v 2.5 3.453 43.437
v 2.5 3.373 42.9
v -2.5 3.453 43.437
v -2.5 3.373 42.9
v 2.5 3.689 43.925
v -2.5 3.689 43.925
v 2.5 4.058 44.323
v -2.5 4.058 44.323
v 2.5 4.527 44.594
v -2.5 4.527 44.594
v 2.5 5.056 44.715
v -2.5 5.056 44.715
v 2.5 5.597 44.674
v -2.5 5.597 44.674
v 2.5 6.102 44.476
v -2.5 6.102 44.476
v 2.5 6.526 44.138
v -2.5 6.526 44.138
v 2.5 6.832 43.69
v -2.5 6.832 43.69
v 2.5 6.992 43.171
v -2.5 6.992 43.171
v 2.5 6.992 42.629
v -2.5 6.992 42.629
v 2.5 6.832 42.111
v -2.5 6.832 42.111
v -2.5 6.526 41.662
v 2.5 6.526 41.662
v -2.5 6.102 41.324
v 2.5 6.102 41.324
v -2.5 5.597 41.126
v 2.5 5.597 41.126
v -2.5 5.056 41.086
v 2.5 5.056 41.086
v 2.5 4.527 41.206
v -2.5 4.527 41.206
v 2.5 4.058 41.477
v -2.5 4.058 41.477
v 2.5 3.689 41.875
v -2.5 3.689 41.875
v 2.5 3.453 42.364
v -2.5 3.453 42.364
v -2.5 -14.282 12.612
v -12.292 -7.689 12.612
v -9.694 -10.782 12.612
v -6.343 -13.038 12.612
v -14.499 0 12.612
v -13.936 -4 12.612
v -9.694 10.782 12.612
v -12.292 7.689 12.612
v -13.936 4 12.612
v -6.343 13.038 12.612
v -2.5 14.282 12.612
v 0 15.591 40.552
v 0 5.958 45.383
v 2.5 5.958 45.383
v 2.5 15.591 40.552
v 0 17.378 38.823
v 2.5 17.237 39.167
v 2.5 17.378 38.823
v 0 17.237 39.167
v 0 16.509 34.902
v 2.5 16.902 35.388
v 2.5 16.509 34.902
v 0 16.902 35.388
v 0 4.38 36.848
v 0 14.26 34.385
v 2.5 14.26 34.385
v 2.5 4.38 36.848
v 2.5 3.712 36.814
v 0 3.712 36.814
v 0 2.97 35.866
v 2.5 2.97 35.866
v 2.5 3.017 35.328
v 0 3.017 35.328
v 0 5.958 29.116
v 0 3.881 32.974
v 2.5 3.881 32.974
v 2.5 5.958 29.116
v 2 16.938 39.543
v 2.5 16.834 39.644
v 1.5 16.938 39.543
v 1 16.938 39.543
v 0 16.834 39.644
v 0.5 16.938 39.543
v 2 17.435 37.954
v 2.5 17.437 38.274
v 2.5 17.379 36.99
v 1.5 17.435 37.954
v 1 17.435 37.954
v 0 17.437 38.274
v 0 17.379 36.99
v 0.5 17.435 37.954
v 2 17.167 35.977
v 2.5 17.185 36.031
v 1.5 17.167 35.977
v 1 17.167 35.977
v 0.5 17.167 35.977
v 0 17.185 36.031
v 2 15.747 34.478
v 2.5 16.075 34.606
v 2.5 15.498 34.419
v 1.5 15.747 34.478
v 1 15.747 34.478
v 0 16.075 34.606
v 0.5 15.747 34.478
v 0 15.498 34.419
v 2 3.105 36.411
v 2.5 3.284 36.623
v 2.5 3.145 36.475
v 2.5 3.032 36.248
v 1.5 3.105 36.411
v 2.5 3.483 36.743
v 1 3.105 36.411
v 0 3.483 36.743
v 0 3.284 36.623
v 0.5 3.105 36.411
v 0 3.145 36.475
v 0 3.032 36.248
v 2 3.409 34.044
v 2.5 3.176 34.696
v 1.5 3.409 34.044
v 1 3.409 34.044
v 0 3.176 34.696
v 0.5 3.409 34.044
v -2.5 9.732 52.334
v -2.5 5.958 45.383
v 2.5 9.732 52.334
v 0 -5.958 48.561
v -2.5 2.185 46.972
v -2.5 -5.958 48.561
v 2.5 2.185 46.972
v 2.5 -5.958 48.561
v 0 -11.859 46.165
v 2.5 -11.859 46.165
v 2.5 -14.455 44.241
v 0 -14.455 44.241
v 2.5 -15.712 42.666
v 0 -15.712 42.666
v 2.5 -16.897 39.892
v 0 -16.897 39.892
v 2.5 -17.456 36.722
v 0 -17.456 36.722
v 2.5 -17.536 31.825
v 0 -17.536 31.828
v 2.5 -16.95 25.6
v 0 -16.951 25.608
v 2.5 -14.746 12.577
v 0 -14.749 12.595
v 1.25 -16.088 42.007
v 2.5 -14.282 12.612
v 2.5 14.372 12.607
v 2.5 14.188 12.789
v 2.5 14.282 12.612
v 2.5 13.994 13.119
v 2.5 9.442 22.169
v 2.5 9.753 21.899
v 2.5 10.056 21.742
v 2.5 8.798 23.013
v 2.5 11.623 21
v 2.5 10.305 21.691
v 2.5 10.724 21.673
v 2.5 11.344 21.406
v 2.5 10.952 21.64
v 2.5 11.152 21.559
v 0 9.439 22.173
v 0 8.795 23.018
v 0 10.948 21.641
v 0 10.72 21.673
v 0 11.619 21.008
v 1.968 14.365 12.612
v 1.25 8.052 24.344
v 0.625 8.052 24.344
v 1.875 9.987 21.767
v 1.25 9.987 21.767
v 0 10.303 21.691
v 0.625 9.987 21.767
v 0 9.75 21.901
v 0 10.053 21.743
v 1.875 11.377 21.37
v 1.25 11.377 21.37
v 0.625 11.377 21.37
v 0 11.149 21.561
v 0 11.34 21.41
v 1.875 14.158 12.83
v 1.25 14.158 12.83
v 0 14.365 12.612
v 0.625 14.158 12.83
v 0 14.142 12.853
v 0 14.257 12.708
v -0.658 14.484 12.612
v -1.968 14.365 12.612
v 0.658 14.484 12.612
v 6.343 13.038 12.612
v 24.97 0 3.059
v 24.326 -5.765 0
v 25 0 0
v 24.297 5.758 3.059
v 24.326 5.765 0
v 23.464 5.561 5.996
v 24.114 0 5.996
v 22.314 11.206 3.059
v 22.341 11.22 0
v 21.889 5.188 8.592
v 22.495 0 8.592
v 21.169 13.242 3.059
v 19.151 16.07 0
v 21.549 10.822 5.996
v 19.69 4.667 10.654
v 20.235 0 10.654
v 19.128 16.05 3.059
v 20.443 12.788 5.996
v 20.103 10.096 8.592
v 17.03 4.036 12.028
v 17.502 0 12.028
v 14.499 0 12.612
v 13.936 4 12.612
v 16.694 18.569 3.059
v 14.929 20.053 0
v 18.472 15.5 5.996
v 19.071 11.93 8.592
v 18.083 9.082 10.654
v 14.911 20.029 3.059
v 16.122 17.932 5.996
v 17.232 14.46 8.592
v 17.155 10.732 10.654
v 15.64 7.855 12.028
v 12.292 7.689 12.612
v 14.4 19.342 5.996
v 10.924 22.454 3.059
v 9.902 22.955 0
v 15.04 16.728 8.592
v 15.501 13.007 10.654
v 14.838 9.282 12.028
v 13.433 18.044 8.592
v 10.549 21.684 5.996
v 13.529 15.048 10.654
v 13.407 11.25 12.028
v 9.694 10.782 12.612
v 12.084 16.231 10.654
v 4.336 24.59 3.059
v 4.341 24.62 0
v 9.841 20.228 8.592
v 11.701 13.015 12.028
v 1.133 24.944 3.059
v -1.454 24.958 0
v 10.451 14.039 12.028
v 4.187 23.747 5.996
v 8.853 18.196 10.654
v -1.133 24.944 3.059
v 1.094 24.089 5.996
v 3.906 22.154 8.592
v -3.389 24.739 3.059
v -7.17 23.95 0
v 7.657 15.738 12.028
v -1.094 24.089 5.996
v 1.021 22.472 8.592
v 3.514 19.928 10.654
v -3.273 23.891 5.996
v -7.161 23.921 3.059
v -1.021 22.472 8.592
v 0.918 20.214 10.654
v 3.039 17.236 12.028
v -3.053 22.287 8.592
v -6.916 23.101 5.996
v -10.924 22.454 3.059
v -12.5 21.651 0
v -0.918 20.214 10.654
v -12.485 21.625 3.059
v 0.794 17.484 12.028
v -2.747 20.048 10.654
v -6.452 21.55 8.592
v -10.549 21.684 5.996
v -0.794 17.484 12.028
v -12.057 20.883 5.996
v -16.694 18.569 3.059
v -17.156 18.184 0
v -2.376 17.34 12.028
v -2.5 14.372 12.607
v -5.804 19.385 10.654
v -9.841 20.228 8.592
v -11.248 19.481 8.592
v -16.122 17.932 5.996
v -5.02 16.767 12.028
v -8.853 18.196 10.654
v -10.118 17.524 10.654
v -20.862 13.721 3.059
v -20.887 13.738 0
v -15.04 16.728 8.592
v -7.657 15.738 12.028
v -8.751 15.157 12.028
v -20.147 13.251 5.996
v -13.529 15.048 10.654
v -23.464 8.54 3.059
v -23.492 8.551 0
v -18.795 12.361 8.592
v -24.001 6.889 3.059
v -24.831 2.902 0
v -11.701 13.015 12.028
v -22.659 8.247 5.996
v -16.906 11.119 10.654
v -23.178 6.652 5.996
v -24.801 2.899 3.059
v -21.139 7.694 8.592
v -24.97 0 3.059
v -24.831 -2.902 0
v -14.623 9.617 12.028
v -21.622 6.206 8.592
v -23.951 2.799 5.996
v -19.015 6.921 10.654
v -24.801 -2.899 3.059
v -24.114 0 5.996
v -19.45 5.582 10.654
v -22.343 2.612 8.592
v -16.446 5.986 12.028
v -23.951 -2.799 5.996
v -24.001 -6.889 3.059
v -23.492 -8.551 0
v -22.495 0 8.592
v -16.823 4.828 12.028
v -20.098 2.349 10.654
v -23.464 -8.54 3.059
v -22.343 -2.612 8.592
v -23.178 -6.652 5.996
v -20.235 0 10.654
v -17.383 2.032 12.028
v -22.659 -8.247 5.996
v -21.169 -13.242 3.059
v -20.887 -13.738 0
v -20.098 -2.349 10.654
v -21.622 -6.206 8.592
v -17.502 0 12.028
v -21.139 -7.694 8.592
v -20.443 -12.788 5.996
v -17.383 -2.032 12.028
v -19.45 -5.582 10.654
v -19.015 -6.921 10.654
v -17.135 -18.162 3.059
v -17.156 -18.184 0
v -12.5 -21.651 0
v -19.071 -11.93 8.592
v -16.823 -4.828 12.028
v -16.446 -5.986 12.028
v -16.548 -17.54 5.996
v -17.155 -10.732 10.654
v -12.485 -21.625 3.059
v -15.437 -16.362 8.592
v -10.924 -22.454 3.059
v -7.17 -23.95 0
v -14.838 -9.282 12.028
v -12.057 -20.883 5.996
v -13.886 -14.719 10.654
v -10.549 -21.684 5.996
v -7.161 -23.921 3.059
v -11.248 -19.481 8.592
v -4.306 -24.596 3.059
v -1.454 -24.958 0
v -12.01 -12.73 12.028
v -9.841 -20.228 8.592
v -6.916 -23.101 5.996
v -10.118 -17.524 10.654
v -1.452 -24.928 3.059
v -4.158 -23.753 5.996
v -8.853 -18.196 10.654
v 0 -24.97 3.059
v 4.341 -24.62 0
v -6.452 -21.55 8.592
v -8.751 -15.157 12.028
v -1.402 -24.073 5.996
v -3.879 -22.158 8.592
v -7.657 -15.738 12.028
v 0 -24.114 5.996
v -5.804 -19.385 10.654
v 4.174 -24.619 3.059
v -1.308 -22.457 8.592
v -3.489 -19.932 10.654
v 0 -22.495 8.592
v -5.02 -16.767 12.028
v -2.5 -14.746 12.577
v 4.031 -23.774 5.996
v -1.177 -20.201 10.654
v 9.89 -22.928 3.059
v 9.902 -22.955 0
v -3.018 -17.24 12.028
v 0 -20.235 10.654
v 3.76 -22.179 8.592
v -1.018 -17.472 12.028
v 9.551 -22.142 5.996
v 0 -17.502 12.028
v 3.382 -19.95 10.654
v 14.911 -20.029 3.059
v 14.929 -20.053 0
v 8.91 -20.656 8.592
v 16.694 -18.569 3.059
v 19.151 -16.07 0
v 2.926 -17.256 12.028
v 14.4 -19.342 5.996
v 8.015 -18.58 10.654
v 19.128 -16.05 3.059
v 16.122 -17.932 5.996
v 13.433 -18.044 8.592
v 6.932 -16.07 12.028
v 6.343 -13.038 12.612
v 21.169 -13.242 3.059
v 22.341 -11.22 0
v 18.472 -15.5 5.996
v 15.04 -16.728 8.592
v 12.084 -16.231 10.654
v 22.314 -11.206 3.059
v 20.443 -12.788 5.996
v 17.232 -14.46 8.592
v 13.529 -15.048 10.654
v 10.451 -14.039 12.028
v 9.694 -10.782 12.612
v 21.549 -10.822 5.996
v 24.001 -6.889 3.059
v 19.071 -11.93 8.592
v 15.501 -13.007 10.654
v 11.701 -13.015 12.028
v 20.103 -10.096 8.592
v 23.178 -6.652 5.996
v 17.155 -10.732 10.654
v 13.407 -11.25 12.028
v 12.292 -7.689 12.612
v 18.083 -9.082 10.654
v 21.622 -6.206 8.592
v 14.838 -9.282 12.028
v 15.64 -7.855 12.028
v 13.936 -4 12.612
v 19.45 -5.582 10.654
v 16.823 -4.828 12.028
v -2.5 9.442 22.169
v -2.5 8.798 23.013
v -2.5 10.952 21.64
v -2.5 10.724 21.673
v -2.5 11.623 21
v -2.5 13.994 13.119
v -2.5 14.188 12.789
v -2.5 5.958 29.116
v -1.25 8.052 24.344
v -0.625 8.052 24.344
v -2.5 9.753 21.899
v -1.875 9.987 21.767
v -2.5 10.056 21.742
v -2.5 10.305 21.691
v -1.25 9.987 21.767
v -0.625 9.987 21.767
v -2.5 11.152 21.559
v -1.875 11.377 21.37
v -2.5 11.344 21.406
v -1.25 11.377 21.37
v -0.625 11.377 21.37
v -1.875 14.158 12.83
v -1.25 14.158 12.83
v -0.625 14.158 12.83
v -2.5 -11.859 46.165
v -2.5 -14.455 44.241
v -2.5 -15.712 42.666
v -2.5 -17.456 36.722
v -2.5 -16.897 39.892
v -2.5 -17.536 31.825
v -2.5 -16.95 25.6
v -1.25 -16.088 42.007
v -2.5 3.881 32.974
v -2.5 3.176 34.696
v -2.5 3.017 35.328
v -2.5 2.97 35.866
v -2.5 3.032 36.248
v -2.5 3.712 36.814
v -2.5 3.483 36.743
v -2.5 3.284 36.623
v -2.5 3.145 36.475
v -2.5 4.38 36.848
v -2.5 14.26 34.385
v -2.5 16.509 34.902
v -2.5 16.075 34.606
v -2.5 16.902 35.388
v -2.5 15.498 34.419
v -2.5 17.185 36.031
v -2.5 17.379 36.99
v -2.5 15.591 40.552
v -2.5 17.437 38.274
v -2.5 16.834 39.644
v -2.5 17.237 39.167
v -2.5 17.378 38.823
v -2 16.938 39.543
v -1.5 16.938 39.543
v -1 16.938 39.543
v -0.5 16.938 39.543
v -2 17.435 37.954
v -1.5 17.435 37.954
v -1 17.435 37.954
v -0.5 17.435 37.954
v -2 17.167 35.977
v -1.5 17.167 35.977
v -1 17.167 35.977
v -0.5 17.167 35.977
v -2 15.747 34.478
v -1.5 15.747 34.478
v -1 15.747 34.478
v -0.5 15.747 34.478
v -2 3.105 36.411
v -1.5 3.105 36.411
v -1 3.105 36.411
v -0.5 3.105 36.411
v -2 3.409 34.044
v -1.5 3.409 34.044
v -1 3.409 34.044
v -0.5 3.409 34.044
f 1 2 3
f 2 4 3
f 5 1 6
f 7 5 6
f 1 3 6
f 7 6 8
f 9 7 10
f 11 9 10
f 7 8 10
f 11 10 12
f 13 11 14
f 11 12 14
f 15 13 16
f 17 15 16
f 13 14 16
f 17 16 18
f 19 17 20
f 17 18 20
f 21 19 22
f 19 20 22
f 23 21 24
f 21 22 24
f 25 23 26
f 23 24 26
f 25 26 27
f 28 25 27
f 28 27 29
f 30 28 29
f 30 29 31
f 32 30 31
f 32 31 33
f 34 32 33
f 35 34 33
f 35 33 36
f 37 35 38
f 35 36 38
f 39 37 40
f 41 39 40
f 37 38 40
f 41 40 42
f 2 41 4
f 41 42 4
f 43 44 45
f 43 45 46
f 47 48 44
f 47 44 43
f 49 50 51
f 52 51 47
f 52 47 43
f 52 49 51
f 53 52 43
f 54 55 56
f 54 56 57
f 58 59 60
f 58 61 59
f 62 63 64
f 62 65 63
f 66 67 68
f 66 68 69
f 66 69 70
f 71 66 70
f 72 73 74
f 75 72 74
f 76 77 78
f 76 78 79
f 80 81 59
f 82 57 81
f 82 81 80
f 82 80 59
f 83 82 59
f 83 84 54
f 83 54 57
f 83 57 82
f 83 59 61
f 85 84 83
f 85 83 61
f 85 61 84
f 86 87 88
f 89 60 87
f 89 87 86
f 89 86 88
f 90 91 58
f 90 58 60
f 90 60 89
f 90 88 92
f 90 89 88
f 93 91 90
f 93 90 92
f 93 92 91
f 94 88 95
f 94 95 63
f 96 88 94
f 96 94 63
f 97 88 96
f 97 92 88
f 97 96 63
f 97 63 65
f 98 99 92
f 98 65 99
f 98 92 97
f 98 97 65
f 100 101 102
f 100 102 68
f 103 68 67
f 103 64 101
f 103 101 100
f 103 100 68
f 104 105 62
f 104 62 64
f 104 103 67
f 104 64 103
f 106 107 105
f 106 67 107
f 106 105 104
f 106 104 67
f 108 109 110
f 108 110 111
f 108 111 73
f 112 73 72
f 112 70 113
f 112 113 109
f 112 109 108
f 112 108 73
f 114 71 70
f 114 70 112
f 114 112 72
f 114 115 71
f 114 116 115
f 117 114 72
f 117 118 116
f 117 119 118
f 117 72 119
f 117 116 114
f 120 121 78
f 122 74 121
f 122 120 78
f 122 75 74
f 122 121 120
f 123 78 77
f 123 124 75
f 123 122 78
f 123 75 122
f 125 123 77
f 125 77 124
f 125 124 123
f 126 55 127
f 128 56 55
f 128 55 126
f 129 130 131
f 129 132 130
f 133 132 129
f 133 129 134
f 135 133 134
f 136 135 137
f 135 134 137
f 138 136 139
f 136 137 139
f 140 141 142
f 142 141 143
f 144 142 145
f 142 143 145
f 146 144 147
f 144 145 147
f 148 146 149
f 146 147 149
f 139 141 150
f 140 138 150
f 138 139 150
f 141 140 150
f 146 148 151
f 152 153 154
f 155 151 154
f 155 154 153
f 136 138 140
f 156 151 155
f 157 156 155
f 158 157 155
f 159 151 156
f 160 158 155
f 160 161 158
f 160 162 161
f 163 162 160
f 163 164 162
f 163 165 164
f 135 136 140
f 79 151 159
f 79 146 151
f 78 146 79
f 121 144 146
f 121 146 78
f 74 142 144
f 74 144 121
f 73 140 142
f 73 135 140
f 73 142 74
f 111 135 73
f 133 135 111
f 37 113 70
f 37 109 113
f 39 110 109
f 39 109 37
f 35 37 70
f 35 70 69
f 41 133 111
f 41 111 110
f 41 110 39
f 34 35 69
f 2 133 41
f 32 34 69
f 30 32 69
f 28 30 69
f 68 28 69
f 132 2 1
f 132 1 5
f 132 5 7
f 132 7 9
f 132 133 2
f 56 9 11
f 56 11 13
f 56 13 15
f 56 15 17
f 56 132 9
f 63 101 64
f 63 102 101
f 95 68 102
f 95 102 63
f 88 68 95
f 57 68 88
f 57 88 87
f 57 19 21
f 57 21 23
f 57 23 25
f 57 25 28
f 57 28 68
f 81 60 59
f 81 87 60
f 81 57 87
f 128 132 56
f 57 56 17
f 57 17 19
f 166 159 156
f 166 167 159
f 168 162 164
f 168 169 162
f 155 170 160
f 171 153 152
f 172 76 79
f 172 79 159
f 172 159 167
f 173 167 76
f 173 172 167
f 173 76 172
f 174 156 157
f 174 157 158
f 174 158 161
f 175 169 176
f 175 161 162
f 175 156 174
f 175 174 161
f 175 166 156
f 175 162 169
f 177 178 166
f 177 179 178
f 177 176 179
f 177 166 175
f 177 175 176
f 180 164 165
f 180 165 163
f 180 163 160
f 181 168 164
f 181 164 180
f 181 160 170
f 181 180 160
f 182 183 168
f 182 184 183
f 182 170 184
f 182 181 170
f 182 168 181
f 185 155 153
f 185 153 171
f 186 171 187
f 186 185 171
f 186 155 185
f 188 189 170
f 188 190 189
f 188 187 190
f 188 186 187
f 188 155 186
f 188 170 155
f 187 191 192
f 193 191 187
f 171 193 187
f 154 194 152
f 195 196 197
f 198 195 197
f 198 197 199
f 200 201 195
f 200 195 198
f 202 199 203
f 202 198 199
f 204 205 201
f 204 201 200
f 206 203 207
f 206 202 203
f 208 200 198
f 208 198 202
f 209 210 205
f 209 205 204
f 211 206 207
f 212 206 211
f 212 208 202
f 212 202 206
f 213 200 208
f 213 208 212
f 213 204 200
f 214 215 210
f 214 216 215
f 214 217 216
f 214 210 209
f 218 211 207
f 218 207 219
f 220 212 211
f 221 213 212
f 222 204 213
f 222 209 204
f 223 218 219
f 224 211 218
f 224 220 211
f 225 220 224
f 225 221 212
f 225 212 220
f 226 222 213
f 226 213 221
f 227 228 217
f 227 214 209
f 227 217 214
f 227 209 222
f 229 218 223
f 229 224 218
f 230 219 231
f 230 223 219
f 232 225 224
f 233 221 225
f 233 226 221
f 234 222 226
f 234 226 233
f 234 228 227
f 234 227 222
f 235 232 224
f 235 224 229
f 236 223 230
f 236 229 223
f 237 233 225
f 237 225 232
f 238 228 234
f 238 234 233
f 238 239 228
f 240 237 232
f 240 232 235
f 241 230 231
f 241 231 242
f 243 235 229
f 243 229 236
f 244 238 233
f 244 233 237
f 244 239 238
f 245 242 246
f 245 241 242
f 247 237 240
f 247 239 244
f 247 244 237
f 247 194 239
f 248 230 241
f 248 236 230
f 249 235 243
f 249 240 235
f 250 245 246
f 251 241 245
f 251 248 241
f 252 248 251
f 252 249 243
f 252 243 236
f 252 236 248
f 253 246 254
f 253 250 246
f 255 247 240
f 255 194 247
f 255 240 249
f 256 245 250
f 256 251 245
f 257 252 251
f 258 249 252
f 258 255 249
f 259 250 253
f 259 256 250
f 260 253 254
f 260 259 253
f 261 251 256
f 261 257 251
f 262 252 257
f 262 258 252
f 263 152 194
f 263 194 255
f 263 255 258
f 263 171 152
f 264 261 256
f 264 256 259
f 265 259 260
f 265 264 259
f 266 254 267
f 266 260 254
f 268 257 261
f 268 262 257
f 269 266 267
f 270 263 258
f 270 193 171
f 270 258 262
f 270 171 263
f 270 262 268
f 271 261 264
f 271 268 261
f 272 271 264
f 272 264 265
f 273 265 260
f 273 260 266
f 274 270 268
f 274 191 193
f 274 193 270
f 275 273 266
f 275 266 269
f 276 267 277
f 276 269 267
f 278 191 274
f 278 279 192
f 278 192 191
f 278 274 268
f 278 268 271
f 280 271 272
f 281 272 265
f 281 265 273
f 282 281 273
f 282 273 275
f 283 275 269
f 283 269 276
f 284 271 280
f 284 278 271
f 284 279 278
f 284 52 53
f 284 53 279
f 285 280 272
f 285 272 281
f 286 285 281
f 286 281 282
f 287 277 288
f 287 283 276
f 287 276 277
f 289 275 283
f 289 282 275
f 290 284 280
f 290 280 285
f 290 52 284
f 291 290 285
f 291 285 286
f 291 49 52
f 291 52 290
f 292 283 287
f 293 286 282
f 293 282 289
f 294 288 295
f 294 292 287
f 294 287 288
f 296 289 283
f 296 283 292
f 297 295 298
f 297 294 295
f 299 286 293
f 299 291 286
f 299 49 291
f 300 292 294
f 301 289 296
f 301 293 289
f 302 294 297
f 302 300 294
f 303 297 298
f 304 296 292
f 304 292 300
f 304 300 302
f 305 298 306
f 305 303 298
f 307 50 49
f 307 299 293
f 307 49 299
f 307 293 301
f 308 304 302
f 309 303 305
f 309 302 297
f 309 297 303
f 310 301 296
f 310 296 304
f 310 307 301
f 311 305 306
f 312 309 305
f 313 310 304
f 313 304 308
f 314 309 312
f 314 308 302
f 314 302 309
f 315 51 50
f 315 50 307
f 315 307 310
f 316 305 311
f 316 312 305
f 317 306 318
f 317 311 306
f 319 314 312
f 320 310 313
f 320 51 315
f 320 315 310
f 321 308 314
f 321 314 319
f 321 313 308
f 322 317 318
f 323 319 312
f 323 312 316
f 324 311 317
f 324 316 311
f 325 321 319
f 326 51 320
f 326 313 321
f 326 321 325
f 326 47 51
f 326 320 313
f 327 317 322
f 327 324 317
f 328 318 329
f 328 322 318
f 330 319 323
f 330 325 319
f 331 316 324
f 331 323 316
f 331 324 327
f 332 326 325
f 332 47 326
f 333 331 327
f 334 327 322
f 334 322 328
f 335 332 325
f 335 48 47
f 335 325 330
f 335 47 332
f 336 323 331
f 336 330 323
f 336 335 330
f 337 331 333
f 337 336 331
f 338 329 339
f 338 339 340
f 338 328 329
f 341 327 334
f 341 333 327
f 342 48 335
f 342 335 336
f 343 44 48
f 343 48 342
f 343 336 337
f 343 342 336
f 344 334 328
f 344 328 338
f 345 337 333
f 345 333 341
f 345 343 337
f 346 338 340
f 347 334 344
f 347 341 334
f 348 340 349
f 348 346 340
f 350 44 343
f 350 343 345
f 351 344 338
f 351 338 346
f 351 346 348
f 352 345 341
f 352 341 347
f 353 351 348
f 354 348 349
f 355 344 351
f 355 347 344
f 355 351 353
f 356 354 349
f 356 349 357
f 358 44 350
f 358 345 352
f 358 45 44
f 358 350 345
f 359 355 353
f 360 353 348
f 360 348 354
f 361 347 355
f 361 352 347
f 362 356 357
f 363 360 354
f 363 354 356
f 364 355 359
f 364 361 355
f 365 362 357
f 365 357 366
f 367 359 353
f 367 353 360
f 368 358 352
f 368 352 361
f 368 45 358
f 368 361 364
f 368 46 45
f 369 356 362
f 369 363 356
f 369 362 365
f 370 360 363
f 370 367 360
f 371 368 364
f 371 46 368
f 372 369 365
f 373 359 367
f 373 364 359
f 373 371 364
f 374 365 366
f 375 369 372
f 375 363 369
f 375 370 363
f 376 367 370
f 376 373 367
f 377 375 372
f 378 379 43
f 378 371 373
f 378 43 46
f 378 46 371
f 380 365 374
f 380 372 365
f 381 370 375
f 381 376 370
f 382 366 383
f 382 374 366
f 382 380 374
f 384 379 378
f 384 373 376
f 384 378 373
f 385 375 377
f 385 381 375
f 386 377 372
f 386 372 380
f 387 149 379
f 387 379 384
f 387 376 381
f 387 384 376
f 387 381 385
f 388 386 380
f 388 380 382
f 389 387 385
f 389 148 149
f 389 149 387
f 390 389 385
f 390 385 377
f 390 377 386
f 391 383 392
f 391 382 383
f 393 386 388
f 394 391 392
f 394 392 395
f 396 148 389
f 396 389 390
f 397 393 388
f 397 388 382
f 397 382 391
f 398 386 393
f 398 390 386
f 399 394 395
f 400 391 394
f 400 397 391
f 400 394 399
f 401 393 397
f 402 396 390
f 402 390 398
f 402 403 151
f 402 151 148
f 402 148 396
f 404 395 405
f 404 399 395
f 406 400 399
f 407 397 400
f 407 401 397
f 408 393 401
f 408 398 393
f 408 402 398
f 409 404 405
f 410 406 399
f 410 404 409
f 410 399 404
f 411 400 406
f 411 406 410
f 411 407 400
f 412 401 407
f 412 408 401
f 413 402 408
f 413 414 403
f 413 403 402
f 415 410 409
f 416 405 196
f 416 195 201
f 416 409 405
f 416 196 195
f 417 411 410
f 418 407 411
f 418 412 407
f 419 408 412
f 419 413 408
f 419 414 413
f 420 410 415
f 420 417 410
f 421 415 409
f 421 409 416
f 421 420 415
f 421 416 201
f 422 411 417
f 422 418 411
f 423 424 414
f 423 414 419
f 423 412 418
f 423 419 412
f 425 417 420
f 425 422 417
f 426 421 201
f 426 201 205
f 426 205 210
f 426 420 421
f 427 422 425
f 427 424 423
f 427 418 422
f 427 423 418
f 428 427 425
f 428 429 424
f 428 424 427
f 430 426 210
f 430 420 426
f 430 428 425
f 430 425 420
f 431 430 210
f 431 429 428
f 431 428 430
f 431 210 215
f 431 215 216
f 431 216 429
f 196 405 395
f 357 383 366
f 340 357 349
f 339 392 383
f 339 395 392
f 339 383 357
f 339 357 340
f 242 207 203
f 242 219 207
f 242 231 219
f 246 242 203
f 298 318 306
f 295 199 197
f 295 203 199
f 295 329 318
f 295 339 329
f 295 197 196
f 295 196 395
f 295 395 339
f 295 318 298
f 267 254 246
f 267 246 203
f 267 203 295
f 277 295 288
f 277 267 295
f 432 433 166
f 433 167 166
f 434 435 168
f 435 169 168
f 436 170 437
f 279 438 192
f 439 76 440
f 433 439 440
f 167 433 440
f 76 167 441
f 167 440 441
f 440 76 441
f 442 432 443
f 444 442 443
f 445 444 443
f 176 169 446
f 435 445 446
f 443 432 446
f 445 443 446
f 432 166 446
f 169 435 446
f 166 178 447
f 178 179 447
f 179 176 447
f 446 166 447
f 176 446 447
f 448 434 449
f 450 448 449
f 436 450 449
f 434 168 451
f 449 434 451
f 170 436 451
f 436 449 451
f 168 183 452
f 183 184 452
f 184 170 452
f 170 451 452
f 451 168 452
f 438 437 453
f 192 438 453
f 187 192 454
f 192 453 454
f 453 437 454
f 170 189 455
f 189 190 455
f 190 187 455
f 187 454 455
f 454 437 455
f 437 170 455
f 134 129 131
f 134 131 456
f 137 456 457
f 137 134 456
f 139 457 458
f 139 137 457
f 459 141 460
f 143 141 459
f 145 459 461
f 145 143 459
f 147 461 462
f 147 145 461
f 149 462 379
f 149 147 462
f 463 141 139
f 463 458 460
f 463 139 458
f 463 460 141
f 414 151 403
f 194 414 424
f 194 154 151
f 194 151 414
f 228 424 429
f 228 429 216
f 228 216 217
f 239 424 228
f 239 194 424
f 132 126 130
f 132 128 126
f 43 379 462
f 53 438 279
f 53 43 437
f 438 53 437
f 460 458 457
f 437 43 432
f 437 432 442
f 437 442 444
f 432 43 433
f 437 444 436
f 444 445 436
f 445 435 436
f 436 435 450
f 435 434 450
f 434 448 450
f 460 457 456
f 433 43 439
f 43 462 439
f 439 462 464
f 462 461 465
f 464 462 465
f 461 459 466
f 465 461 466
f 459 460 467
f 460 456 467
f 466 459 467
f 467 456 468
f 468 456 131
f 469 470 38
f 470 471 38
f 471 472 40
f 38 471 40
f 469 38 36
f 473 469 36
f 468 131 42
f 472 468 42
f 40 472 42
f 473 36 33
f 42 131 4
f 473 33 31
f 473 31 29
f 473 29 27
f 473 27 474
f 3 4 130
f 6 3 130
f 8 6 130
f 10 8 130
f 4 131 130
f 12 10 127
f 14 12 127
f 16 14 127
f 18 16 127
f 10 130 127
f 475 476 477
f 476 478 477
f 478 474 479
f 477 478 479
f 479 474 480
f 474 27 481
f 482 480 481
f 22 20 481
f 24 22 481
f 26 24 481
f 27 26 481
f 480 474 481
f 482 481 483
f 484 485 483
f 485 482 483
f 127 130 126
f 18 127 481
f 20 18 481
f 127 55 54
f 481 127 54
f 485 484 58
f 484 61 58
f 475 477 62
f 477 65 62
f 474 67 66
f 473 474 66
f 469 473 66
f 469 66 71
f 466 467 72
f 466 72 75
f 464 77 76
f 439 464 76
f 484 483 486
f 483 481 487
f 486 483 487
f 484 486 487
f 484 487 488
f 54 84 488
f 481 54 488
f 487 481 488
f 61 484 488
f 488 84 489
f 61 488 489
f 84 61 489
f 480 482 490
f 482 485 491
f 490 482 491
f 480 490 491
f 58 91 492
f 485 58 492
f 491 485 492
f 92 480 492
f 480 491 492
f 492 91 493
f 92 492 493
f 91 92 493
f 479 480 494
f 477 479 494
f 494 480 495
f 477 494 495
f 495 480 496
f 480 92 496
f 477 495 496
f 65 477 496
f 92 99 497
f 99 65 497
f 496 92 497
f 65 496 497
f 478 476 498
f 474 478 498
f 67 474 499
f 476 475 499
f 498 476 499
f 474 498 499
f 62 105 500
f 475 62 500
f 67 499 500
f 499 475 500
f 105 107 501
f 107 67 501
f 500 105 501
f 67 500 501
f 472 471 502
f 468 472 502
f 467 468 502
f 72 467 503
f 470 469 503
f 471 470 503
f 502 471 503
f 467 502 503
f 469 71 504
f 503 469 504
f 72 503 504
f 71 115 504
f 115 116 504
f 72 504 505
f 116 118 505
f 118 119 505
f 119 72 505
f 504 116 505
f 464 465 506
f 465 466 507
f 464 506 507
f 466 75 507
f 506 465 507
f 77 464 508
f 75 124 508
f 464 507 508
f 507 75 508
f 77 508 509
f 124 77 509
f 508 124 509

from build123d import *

# Parameters (mm, degrees)
F3_DEPTH = 2.5
F4_R     = 1.8196916791
F5_DEPTH = 12.5


with BuildPart() as f1:
    # F0 (on Front) → F1 (revolve)
    with BuildSketch(Plane.XZ):
        with BuildLine():
            Line((0, 12.6119172201), (0, 0))
            Line((0, 0), (25, 0))
            ThreePointArc((25, 0), (22.4952746146, 8.5923260716), (14.4987376407, 12.6119172201))
            Line((14.4987376407, 12.6119172201), (0, 12.6119172201))
        make_face()
    revolve(axis=Axis((0, 0, 6.4052655362), (0, 0, 1)))

    # F2 (on Right) → F3 (join, symmetric)
    with BuildSketch(Plane.YZ):
        with BuildLine():
            Line((2.1847422576, 46.9719432423), (-5.9583863368, 48.5608466098))
            add(Edge.make_bspline(
                [(-5.9583863368, 48.5608466098), (-10.0494005511, 47.1754783535), (-20.5400337185, 43.6229630605), (-16.933797457, 24.3011579967), (-14.7338788979, 12.5142439035)],
                knots=[0, 0, 0, 0, 0.3899682781, 1, 1, 1, 1], degree=3))
            Line((-14.7338788979, 12.5142439035), (14.3563159969, 12.5142439035))
            Line((14.3563159969, 12.5142439035), (14.5549291134, 12.5142439035))
            add(Edge.make_bspline(
                [(5.9583861939, 29.1159117124), (7.3715471144, 25.6909691113), (9.3716990081, 20.8433924381), (12.1028325627, 22.5996535769), (13.4960797579, 12.6119545714), (14.5689436565, 12.5194712617), (14.5549291134, 12.5142439035)],
                knots=[0, 0, 0, 0, 0.3508050155, 0.4965204434, 0.8596904558, 0.9459946347, 0.9459946347, 0.9459946347, 0.9459946347], degree=3))
            add(Edge.make_bspline(
                [(5.9583861939, 45.3830437264), (10.7803563989, 43.1370729353), (17.3665075442, 40.0693841839), (17.482964474, 38.1086396633), (17.1146182218, 31.5098055074), (-0.5193064524, 40.5736312242), (3.9619187914, 32.6472561057), (5.9583861939, 29.1159117124)],
                knots=[0, 0, 0, 0, 0.2683818231, 0.3665728282, 0.5161710799, 0.7844454132, 1, 1, 1, 1], degree=3))
            Line((5.9583861939, 45.3830437264), (9.7320311578, 52.3344949017))
            Line((9.7320311578, 52.3344949017), (2.1847422576, 46.9719432423))
        make_face()
    extrude(amount=F3_DEPTH, both=True)

    # F4 (on face) → F5 (cut, symmetric)
    with BuildSketch(Plane(origin=(-2.5, 0, 0), x_dir=(0, -1, 0), z_dir=(-1, 0, 0))):
        with Locations((-5.1921997219, 42.9001860321)):
            Circle(F4_R)
    extrude(amount=F5_DEPTH, both=True, mode=Mode.SUBTRACT)


solid = f1.part
